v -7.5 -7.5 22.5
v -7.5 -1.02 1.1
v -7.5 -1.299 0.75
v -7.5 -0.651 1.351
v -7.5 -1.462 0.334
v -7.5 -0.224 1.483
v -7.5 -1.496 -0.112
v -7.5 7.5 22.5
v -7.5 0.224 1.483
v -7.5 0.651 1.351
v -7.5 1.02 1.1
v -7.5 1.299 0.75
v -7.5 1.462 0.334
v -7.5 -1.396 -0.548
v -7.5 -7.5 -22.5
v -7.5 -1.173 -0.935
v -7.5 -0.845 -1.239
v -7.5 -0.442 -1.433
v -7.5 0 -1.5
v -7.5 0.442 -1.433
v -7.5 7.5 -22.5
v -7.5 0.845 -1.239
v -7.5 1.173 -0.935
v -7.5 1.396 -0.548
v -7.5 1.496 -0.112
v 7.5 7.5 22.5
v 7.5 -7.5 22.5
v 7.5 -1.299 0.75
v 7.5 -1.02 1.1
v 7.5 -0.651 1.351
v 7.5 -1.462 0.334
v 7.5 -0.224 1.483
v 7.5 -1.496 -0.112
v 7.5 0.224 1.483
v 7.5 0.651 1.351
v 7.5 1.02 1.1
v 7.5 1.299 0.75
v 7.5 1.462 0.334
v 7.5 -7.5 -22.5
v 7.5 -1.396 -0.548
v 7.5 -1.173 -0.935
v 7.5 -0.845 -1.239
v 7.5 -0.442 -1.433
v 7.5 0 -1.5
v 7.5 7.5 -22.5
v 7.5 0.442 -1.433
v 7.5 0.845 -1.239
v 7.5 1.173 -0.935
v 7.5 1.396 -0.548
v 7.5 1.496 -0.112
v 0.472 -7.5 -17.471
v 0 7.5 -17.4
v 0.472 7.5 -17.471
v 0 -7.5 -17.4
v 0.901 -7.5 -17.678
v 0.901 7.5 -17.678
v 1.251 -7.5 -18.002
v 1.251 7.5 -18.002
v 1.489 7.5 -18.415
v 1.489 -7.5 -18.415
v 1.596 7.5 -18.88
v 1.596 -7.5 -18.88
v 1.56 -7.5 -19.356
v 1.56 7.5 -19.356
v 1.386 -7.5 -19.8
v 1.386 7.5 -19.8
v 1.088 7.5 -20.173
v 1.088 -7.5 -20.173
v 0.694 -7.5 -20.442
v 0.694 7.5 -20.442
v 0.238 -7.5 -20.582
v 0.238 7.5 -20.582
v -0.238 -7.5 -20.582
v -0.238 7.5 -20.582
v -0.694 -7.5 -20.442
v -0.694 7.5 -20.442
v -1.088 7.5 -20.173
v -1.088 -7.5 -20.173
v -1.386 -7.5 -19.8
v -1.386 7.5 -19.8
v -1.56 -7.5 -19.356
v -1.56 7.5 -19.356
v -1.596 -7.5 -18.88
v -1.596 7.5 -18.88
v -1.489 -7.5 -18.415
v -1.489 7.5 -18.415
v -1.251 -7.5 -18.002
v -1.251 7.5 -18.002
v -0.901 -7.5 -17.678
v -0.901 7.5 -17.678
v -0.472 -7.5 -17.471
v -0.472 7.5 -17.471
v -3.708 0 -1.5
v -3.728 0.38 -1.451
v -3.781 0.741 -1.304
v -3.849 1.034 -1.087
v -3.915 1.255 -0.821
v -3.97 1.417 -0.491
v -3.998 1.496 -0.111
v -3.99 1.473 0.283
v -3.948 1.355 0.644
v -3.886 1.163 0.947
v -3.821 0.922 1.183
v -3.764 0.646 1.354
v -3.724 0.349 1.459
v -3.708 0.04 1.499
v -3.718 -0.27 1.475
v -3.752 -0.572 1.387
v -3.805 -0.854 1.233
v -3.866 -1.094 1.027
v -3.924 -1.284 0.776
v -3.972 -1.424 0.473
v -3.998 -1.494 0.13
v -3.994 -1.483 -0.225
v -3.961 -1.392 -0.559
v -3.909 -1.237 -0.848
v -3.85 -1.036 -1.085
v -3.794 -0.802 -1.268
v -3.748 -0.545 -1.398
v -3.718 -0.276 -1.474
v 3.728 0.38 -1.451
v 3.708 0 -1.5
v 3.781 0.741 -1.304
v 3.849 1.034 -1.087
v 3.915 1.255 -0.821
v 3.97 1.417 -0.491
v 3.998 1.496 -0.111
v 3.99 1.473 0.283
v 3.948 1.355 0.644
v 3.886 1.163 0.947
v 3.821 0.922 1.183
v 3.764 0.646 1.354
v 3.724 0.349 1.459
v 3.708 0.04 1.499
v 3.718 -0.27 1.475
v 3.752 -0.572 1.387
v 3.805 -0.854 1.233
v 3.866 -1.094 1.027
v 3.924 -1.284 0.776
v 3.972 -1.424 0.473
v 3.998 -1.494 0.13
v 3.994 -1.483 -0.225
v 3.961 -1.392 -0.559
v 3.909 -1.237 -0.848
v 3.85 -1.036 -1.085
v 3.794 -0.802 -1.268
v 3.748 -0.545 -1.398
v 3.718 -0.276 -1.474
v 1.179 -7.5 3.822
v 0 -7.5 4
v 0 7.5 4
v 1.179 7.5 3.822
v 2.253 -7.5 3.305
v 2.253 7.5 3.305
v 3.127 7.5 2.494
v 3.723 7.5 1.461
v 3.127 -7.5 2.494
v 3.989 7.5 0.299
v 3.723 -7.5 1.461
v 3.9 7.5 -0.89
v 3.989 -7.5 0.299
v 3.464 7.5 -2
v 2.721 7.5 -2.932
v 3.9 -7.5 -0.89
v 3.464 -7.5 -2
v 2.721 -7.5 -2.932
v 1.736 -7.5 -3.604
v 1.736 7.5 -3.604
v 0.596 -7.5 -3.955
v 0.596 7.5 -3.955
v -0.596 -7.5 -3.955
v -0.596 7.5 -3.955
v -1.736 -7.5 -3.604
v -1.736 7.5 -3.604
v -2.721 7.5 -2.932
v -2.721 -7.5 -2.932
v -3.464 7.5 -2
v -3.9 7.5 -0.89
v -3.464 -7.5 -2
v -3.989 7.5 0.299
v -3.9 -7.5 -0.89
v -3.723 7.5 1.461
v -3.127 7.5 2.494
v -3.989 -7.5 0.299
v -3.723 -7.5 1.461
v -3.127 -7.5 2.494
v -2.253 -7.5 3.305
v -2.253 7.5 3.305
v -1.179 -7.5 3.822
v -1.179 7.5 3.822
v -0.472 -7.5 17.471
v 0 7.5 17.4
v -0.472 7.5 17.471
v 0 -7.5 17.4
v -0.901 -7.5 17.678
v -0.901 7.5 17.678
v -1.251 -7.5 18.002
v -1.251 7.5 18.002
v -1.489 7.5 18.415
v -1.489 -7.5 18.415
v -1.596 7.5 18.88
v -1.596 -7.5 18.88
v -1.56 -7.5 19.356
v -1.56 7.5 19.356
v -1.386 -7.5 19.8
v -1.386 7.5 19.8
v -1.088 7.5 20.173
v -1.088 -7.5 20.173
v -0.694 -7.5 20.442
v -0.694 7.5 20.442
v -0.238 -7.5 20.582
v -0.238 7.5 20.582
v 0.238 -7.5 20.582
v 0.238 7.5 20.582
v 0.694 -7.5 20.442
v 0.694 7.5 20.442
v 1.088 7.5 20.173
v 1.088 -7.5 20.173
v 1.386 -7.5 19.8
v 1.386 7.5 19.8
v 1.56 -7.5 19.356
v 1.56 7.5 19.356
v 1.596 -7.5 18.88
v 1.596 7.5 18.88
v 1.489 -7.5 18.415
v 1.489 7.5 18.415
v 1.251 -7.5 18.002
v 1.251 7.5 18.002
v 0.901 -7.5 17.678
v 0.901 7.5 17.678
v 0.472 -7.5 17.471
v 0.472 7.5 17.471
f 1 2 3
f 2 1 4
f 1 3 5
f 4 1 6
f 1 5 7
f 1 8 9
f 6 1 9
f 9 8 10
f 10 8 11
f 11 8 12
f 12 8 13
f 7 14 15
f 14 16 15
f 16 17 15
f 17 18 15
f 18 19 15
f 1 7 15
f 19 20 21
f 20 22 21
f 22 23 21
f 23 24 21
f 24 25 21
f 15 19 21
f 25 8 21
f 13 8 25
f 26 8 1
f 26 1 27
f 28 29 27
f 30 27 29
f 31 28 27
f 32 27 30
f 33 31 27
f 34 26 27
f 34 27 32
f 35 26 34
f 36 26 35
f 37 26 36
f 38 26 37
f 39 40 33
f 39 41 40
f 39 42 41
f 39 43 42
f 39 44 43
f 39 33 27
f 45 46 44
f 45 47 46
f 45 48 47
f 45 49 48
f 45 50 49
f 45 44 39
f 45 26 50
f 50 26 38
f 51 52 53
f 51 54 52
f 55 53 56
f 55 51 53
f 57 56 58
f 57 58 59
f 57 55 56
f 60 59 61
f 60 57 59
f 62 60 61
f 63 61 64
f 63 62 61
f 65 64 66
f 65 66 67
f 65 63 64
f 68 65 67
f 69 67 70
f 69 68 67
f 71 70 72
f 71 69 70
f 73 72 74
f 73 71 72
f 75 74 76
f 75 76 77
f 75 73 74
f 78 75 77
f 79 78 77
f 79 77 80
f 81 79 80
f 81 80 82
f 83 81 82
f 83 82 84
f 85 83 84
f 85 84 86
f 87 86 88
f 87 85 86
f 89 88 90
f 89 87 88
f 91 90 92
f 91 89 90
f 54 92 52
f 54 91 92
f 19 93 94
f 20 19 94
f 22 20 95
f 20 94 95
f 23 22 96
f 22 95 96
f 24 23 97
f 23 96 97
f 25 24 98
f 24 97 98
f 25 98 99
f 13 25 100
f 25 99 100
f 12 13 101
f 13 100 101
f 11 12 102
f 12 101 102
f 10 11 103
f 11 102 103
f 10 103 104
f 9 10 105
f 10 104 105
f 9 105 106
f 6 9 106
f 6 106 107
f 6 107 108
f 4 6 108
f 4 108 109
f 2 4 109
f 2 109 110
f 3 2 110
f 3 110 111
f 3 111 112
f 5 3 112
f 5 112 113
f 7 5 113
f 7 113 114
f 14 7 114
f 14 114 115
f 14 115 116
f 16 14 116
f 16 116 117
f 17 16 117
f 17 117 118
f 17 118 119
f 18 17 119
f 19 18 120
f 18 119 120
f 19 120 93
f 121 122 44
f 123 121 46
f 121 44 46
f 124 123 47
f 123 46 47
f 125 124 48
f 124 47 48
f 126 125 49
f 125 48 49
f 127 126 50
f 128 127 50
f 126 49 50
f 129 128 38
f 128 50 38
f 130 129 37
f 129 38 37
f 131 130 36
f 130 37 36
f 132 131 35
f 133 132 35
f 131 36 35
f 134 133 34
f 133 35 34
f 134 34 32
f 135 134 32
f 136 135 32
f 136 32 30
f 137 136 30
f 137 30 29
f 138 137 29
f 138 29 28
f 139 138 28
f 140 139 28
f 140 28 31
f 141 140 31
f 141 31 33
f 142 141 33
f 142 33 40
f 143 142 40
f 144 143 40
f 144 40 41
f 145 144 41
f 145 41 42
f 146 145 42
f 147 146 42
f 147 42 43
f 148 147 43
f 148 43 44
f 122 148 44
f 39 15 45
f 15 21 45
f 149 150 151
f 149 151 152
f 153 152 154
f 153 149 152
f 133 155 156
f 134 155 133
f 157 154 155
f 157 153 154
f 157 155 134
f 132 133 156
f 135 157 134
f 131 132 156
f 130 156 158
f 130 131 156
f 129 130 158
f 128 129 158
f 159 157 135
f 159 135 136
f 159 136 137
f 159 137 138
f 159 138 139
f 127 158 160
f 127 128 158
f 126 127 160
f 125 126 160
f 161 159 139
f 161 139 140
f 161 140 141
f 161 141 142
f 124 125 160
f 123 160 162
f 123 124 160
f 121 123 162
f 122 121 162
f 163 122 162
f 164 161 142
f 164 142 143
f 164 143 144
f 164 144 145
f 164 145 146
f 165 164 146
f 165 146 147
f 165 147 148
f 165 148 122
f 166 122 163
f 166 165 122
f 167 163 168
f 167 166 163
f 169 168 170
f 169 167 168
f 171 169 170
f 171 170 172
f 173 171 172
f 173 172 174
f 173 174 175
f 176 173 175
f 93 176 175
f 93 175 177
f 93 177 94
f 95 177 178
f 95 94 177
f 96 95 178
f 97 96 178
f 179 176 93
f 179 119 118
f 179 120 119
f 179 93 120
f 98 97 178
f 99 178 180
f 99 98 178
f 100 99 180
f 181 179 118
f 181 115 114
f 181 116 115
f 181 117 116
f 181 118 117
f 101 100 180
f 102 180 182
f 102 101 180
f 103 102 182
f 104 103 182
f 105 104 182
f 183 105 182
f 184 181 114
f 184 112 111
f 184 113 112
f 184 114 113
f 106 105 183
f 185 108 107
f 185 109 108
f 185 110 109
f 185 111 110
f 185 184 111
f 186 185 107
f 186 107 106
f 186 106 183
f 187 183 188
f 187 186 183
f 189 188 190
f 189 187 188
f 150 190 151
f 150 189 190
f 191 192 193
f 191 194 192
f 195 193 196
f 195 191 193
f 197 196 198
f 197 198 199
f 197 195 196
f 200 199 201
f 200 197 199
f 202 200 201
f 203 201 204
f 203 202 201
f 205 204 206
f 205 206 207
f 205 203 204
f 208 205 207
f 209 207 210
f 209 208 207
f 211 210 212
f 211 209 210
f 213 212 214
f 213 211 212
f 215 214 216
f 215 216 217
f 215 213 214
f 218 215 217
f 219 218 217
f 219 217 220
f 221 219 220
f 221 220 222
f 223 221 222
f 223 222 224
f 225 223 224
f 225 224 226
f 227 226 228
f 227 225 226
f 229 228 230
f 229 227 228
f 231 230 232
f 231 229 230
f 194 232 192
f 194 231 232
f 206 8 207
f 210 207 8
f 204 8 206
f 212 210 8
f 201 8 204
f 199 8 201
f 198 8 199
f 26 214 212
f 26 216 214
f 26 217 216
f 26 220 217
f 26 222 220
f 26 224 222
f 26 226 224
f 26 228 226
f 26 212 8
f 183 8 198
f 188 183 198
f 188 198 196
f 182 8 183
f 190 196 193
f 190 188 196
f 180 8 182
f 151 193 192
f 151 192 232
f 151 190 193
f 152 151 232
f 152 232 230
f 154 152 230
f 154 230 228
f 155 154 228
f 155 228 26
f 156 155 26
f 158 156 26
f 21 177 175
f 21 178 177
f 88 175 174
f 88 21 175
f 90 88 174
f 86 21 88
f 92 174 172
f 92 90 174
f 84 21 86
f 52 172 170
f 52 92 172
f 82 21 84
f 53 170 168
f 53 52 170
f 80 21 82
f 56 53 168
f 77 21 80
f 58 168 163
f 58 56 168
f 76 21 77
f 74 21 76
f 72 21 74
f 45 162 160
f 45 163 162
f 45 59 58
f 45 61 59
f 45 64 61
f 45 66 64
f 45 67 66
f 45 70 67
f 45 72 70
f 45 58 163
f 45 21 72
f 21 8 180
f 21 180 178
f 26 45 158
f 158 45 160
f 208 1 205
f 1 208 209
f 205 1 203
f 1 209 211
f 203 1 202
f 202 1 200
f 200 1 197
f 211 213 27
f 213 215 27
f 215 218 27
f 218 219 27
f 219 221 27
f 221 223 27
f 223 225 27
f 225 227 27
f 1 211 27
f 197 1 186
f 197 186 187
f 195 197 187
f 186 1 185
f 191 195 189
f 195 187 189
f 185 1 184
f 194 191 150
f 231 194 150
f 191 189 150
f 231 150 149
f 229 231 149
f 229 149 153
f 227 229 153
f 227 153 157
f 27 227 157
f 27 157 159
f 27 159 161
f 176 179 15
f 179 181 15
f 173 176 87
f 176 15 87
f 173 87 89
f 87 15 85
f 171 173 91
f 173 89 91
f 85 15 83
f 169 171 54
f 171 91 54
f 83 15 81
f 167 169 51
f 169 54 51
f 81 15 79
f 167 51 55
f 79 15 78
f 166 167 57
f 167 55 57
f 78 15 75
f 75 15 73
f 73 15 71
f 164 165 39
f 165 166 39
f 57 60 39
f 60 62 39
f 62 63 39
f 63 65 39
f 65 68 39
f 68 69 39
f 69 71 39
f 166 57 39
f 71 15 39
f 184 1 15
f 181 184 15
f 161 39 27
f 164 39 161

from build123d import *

# Parameters (mm, degrees)
SKETCH_1_W          = 15
SKETCH_1_H          = 45
SKETCH_1_R          = 4
SKETCH_1_R_2        = 1.6
EXTRUDE_1_DEPTH     = 7.5
SKETCH_2_R          = 1.5
CUT_EXTRUDE_1_DEPTH = 29.062430401


with BuildPart() as part:
    # 草图1 → 凸台-拉伸1 (new, symmetric)
    with BuildSketch(Plane(origin=(0, 0, 0), x_dir=(1, 0, 0), z_dir=(0, 1, 0))):
        Rectangle(SKETCH_1_W, SKETCH_1_H)
        with Locations(Location((0, 0, 0), (0, 0, 270))):
            Circle(SKETCH_1_R, mode=Mode.SUBTRACT)
        with Locations(Location((0, 19, 0), (0, 0, 270))):
            Circle(SKETCH_1_R_2, mode=Mode.SUBTRACT)
        with Locations(Location((0, -19, 0), (0, 0, 90))):
            Circle(SKETCH_1_R_2, mode=Mode.SUBTRACT)
    extrude(amount=EXTRUDE_1_DEPTH, both=True)

    # 草图2 → 切除-拉伸1 (cut, through all)
    with BuildSketch(Plane(origin=(7.5, 0, 0), x_dir=(0, 0, -1), z_dir=(1, 0, 0))):
        Circle(SKETCH_2_R)
    extrude(amount=-CUT_EXTRUDE_1_DEPTH, mode=Mode.SUBTRACT)


solid = part.part
